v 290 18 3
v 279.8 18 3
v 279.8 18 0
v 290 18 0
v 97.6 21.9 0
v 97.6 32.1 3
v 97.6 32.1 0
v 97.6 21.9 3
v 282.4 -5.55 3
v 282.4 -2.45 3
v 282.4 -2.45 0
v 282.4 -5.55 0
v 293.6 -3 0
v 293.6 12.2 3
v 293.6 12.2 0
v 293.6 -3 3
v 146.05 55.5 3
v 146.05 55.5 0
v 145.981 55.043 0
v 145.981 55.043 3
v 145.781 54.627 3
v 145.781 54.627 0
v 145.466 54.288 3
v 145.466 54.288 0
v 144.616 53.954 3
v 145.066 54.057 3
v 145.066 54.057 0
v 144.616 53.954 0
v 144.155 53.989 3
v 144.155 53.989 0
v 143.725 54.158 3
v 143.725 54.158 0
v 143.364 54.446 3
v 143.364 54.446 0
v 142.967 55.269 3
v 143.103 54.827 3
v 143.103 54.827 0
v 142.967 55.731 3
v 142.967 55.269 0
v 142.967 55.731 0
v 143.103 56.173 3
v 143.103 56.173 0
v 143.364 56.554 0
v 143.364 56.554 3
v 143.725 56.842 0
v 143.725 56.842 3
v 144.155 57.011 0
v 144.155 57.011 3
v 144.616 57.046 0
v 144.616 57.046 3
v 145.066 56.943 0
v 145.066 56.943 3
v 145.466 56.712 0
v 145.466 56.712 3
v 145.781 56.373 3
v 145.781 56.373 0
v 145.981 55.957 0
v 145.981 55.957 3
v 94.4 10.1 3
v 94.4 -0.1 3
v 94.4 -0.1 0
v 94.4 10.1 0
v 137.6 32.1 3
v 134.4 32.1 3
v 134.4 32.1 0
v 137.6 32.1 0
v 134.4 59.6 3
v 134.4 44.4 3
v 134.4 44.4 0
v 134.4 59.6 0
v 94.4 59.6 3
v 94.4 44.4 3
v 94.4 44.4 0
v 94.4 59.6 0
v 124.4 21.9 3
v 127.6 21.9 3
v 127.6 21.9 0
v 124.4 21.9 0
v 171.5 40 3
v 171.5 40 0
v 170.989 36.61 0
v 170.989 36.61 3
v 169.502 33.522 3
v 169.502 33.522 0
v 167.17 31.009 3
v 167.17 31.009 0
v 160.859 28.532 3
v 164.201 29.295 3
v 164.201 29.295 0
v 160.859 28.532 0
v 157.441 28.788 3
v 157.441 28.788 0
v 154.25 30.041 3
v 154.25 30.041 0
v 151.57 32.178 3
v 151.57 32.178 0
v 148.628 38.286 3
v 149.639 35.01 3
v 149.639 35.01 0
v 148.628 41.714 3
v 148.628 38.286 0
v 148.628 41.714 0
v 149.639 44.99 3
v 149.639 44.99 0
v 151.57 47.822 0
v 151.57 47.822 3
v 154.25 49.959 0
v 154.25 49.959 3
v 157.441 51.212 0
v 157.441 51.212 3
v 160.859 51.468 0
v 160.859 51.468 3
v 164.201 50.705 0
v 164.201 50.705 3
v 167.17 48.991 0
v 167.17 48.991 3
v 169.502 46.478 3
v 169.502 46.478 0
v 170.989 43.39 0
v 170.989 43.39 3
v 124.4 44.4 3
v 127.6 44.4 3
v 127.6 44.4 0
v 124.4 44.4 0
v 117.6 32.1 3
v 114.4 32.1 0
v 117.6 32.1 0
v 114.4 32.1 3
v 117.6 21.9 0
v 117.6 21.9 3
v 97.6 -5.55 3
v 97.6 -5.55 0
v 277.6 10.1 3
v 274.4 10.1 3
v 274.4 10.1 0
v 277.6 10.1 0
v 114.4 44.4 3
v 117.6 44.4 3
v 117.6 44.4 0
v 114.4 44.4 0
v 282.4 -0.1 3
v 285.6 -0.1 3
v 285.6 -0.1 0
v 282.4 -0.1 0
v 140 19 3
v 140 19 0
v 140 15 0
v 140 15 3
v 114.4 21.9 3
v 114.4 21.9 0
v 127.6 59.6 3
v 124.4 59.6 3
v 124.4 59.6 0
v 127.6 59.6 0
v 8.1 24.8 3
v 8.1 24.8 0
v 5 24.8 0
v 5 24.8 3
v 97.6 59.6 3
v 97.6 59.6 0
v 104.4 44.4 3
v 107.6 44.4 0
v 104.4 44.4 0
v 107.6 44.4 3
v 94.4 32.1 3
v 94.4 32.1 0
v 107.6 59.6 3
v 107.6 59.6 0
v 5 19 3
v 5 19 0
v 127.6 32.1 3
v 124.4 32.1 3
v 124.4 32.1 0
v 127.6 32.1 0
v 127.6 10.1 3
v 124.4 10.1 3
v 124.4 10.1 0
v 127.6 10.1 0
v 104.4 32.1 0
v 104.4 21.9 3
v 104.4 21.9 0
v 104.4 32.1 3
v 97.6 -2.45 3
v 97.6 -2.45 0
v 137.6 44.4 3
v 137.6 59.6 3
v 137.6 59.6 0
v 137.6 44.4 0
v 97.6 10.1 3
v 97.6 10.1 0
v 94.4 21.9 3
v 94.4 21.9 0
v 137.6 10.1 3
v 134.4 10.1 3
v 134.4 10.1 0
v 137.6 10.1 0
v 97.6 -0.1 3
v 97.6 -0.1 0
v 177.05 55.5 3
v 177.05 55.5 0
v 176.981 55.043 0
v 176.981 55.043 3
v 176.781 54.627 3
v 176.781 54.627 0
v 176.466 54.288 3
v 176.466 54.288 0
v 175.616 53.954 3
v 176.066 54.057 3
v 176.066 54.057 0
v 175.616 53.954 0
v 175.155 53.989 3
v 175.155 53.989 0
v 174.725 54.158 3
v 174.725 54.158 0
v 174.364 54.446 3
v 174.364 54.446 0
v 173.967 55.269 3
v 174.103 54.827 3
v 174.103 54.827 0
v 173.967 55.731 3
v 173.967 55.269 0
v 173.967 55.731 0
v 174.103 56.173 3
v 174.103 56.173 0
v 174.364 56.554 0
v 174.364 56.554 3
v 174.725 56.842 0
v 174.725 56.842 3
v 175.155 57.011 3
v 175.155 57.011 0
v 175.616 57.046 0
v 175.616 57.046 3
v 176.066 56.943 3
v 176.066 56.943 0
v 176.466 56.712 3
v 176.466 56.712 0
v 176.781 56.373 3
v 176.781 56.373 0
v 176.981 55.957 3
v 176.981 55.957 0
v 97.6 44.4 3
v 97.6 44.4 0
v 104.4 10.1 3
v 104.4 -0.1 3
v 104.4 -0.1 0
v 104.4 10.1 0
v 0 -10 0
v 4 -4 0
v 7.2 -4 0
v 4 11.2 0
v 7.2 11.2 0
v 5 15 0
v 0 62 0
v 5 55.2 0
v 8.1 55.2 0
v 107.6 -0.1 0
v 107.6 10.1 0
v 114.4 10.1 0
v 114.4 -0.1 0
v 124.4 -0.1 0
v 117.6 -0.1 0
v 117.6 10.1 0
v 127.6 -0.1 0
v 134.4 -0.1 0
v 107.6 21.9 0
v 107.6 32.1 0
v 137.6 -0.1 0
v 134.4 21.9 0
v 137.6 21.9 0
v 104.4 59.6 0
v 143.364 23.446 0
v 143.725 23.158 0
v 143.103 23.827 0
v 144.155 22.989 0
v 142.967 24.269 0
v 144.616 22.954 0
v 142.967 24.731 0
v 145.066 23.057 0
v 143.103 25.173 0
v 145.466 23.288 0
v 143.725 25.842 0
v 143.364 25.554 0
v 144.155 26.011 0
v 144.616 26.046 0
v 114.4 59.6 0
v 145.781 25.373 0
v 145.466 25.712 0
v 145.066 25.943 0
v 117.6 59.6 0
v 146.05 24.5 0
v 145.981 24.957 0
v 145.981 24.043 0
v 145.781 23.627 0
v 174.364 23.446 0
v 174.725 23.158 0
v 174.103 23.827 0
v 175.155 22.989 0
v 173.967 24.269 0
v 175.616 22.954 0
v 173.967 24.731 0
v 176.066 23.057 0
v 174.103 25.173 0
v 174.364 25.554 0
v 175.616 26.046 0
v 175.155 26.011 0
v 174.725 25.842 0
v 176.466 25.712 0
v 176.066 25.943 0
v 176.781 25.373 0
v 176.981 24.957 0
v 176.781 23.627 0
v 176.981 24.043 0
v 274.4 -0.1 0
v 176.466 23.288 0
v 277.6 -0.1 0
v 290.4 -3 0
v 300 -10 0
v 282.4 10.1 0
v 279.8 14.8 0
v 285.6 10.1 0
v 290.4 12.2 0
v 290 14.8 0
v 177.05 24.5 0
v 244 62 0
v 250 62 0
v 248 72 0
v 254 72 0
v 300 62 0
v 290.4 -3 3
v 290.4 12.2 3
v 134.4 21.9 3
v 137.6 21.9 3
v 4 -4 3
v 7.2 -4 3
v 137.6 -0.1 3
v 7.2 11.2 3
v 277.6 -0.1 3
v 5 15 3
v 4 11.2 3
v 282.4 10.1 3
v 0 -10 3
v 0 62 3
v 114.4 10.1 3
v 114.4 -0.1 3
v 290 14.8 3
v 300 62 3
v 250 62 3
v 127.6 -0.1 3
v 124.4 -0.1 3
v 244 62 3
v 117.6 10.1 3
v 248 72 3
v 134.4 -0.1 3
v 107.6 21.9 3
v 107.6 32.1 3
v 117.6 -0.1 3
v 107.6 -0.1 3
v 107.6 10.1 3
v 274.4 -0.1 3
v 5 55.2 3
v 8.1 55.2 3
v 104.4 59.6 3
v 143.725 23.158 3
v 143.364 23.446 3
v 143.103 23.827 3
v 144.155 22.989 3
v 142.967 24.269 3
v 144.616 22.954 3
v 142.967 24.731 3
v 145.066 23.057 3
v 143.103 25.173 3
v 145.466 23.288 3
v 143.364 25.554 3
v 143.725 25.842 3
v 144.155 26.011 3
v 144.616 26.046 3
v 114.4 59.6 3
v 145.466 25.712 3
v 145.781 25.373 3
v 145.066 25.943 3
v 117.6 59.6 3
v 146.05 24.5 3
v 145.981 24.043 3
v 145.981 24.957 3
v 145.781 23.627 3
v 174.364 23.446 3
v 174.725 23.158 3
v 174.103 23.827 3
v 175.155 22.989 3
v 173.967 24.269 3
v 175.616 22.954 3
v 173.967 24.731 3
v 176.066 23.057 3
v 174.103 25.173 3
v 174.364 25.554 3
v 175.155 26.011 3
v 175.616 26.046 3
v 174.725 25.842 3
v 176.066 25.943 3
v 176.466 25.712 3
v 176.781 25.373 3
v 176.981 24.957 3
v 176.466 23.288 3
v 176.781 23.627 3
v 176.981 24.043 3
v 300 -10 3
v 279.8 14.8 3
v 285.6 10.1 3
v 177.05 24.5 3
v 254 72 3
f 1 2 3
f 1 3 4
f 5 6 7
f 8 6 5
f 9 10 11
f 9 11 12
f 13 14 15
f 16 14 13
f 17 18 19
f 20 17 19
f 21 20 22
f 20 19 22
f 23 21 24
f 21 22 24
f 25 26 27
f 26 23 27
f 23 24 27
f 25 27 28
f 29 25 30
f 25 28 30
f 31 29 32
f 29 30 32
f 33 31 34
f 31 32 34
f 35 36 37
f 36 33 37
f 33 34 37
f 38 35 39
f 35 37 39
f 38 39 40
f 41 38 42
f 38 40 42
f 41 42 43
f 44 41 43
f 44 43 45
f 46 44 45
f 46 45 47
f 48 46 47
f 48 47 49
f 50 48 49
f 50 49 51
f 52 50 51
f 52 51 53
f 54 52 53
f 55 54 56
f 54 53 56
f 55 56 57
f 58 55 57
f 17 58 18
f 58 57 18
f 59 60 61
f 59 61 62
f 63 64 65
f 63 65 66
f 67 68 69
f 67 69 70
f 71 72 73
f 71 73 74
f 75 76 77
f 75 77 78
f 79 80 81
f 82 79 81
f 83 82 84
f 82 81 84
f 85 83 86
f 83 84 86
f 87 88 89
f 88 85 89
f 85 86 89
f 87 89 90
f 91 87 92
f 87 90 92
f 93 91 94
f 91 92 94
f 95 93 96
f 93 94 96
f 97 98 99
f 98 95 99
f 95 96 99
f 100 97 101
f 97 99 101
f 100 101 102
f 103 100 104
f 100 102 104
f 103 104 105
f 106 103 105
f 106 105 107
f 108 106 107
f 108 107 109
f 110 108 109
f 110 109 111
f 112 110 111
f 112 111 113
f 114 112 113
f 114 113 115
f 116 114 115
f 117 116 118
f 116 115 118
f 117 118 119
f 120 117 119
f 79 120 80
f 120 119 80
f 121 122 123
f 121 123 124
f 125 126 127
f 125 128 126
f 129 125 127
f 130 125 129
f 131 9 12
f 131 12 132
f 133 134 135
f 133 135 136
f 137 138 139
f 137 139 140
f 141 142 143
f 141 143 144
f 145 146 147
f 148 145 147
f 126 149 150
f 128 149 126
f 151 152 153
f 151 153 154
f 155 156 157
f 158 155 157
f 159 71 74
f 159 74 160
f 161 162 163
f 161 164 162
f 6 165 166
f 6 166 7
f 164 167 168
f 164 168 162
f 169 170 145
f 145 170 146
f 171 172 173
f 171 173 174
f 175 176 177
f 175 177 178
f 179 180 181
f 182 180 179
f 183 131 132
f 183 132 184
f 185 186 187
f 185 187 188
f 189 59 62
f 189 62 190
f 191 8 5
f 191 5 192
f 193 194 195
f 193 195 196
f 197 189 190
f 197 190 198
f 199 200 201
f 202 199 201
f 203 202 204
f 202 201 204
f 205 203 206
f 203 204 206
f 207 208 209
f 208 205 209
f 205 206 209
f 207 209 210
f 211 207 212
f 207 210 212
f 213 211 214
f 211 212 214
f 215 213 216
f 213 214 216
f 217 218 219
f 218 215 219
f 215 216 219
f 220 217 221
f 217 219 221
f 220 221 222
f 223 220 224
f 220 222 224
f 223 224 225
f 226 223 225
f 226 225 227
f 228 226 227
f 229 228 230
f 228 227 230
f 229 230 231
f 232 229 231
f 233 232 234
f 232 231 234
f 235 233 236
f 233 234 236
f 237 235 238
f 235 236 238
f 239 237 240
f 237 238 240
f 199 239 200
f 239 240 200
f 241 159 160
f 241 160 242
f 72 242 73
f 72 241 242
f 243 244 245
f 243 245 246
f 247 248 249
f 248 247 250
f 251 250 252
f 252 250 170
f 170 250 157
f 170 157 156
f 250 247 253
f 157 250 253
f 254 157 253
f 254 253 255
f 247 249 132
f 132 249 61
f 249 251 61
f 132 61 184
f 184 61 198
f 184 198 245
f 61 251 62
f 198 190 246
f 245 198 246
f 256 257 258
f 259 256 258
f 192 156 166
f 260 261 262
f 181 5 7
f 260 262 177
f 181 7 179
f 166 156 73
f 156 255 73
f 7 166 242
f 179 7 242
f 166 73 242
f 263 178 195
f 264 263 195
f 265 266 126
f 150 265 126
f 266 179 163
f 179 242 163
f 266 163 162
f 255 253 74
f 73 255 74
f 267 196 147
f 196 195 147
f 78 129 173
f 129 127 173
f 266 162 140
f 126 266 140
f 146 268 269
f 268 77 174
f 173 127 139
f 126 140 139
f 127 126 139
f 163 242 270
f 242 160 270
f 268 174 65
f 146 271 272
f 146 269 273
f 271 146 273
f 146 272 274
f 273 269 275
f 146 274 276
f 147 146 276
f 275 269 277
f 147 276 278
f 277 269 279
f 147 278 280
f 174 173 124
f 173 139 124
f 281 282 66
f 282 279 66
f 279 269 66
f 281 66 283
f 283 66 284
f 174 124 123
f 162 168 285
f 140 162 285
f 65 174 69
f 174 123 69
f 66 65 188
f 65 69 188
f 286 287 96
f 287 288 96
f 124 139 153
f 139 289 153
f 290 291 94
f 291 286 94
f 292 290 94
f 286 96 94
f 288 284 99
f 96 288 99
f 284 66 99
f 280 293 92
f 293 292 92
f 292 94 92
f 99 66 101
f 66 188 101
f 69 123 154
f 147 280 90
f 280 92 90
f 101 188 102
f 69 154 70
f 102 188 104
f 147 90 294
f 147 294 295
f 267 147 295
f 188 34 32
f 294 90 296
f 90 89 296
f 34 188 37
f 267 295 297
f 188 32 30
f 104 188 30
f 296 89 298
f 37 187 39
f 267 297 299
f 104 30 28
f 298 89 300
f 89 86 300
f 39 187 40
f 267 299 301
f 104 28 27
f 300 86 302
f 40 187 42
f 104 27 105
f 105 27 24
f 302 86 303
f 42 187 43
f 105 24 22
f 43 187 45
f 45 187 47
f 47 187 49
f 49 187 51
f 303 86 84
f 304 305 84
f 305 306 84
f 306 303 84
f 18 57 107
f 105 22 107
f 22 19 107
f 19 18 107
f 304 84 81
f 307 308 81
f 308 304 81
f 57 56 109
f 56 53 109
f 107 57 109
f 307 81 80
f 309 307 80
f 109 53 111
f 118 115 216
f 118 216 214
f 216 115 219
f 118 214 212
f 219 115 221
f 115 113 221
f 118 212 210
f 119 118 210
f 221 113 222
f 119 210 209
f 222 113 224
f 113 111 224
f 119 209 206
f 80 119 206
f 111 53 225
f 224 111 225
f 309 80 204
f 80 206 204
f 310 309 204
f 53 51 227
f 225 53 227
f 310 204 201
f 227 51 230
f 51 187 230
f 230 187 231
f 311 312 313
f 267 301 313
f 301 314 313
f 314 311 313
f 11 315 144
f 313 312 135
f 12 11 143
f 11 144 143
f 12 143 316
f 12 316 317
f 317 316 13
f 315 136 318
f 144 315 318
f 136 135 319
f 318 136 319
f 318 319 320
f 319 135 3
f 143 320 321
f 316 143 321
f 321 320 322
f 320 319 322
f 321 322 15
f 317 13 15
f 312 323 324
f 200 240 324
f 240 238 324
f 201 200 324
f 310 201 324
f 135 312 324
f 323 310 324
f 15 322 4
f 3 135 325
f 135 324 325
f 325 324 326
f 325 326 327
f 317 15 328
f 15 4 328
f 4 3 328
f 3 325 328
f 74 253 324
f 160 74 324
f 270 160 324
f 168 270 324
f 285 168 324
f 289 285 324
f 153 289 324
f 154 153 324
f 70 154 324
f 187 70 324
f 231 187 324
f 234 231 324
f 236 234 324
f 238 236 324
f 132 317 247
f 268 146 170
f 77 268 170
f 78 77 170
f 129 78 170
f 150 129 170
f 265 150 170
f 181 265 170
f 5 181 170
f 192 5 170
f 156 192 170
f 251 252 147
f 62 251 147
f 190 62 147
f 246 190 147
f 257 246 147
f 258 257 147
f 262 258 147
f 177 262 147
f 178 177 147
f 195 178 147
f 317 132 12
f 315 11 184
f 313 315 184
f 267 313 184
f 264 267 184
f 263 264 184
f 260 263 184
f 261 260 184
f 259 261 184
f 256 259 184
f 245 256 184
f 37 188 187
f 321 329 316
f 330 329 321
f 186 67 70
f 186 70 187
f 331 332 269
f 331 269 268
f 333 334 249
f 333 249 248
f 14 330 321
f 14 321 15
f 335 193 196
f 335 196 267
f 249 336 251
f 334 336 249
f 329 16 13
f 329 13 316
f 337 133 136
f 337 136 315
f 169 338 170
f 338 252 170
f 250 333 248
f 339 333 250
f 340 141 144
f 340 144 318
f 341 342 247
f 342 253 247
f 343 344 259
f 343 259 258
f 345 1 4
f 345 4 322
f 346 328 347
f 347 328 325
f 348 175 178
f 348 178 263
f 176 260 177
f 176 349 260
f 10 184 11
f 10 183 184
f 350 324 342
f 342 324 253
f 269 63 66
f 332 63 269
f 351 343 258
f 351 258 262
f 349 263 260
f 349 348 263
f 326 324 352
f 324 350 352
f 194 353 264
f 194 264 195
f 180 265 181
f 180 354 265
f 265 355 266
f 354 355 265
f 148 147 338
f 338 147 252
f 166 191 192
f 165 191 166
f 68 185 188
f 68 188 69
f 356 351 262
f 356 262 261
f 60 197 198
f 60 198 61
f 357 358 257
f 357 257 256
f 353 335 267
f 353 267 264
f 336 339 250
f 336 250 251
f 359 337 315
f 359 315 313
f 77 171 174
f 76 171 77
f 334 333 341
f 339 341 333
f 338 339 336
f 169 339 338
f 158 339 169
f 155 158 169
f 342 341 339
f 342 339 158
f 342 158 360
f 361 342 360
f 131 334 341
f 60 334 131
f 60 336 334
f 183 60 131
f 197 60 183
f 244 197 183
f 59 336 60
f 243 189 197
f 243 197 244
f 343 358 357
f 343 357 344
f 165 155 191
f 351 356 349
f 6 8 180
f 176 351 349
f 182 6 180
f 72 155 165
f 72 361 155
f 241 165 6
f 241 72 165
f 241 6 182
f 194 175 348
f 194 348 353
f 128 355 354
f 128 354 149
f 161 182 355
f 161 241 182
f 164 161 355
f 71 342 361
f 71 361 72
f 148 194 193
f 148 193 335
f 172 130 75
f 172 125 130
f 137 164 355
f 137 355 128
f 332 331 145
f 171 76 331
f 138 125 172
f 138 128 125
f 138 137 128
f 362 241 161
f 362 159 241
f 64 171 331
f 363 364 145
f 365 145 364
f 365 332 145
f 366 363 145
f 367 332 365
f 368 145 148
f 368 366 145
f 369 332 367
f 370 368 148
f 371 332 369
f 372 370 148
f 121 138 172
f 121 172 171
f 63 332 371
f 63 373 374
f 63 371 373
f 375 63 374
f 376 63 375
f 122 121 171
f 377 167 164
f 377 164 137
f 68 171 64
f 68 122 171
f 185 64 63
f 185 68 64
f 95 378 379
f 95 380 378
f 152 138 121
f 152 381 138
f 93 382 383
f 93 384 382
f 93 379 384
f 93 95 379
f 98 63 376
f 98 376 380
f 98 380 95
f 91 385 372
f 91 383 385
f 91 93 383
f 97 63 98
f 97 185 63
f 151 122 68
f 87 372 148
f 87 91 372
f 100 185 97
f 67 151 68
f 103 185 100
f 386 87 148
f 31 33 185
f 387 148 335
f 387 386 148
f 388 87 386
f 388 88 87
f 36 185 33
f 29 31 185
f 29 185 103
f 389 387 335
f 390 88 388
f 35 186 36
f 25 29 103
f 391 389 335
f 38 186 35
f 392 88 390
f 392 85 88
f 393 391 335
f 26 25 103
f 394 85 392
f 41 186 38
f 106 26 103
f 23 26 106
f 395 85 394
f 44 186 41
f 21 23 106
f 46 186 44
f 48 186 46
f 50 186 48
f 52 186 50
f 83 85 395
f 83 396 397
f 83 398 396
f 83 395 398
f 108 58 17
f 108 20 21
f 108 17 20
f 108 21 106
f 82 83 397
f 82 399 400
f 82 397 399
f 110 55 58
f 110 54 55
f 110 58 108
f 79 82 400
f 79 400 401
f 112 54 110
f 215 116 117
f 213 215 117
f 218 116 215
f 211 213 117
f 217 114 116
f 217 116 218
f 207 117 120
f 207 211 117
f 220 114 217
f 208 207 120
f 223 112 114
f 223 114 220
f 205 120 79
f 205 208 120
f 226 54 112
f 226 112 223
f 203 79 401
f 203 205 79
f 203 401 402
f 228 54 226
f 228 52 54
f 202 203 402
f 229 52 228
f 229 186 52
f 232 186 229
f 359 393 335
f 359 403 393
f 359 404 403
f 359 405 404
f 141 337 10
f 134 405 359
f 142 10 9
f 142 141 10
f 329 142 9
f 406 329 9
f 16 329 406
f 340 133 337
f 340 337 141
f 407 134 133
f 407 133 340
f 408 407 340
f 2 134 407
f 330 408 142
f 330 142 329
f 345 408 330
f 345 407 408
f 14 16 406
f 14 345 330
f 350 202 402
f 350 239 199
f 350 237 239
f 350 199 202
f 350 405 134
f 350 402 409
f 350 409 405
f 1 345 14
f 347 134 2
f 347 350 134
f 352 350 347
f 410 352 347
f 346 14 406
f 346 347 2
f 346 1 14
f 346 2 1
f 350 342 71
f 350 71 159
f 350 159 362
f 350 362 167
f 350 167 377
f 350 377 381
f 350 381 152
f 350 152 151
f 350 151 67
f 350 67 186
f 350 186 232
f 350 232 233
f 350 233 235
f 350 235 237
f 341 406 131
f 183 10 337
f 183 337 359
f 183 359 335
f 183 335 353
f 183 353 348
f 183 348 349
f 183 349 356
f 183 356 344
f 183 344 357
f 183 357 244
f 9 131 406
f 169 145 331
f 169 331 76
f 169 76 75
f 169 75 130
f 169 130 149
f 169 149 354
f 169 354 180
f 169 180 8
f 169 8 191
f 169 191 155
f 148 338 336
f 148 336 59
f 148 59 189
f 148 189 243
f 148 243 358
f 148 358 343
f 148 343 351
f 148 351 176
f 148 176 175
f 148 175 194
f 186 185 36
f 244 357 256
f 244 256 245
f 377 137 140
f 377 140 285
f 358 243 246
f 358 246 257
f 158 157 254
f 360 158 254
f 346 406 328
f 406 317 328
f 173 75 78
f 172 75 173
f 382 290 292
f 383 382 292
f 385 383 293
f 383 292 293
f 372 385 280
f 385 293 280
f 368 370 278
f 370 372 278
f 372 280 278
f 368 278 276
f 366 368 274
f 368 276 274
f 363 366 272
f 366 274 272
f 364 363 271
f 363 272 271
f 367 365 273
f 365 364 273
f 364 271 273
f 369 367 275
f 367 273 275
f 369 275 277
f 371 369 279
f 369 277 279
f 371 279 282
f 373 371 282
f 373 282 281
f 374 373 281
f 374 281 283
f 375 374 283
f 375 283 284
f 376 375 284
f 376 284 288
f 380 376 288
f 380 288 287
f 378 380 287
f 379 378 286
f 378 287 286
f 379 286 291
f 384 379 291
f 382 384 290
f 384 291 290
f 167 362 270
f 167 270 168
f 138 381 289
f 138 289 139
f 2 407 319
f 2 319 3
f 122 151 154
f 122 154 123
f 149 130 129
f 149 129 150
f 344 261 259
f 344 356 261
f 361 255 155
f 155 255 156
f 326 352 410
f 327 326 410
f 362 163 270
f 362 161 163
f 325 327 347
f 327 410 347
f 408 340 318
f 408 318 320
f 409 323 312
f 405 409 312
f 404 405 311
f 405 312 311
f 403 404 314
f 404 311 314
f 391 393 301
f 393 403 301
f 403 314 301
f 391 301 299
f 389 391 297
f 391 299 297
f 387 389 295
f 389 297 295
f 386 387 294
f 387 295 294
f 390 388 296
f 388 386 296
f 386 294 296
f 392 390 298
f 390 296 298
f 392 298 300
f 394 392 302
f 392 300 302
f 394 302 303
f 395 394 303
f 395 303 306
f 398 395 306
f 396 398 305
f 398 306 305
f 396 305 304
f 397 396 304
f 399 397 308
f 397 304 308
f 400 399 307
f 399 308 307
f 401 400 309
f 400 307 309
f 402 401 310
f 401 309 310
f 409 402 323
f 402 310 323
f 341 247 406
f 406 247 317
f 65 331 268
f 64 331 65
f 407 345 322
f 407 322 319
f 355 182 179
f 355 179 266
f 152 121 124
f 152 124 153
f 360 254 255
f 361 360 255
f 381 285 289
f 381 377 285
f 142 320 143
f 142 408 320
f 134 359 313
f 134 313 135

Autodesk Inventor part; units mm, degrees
ref_plane "YZ Plane" through (0, 0, 0) normal (1, 0, 0) x (0, 1, 0)
ref_plane "XZ Plane" through (0, 0, 0) normal (0, 1, 0) x (-1, 0, 0)
ref_plane "XY Plane" through (0, 0, 0) normal (0, 0, 1) x (1, 0, 0)
sketch "Sketch1" plane through (0, 0, 0) normal (0, 0, 1) x (1, 0, 0)
  line L0 (0, 0) -> (300, 0)
  line L1 (300, 0) -> (300, 62)
  line L2 (300, 62) -> (0, 62)
  line L3 (0, 62) -> (0, 0)
  circle A0 centre (144.5, 55.5) radius 1.55
  circle A1 centre (144.5, 24.5) radius 1.55
  circle A2 centre (175.5, 55.5) radius 1.55
  circle A3 centre (175.5, 24.5) radius 1.55
  circle A4 centre (160, 40) radius 11.5
  line L4 (5, 19) -> (140, 19)
  line L5 (140, 19) -> (140, 15)
  line L6 (140, 15) -> (5, 15)
  line L7 (5, 15) -> (5, 19)
  line L8 (0, 62) -> (39.6145, 62)
  line L9 (8.1, 24.8) -> (5, 24.8)
  line L10 (5, 24.8) -> (5, 55.2)
  line L11 (5, 55.2) -> (8.1, 55.2)
  line L12 (8.1, 55.2) -> (8.1, 24.8)
  line L13 (8.1, 24.8) -> (5, 55.2) construction
  line L14 (5, 24.8) -> (8.1, 55.2) construction
  line L15 (0, 62) -> (50, 62)
  line L16 (0, 0) -> (0, -10)
  line L17 (0, -10) -> (300, -10)
  line L18 (300, -10) -> (300, 0)
  point P0 (6.55, 40)
  point P1 (5, 40)
  point P2 (8.1, 40)
  point P3 (5, 17)
  point P4 (140, 17)
  dimension "d1" = 3.1
  dimension "d2" = 3.1
  dimension "d3" = 3.1
  dimension "d4" = 3.1
  dimension "d5" = 31
  dimension "d7" = 23
  dimension "d8" = 15.5
  dimension "d9" = 15.5
  dimension "d10" = 62
  dimension "d11" = 31
  dimension "d13" = 40
  dimension "d54" = 300
  dimension "d55" = 3.1
  dimension "d56" = 5
  dimension "d57" = 15.2
  dimension "d59" = 135
  dimension "d93" = 15
  dimension "d106" = 20
  dimension "d107" = 5
  dimension "d201" = 4
  dimension "d202" = 10
extrude "Extrusion1" add sketch "Sketch1" along normal blind 3
sketch "Sketch4" plane through (0, 0, 3) normal (0, 0, 1) x (1, 0, 0)
  line L0 (300, 62) -> (0, 62) projected
  line L1 (244, 62) -> (248, 72)
  line L2 (248, 72) -> (254, 72)
  line L3 (254, 72) -> (250, 62)
  line L4 (0, -10) -> (300, -10) projected
  point P0 (0, 0)
  dimension "d108" = 10
  dimension "d109" = 4
  dimension "d110" = 50
  dimension "d111" = 6
extrude "Extrusion4" add sketch "Sketch4" against normal blind 3
sketch "Sketch7" plane through (0, 0, 3) normal (0, 0, 1) x (1, 0, 0)
  line L0 (134.4, 59.6) -> (137.6, 59.6)
  line L1 (137.6, 59.6) -> (137.6, 44.4)
  line L2 (137.6, 44.4) -> (134.4, 44.4)
  line L3 (134.4, 44.4) -> (134.4, 59.6)
  line L4 (134.4, 59.6) -> (137.6, 44.4) construction
  line L5 (137.6, 59.6) -> (134.4, 44.4) construction
  line L6 (134.4, 32.1) -> (137.6, 32.1)
  line L7 (137.6, 32.1) -> (137.6, 21.9)
  line L8 (137.6, 21.9) -> (134.4, 21.9)
  line L9 (134.4, 21.9) -> (134.4, 32.1)
  line L10 (134.4, 32.1) -> (137.6, 21.9) construction
  line L11 (137.6, 32.1) -> (134.4, 21.9) construction
  line L12 (244, 62) -> (0, 62) projected
  circle A0 centre (144.5, 55.5) radius 1.55 projected
  line L13 (124.4, 59.6) -> (127.6, 59.6)
  line L14 (127.6, 59.6) -> (127.6, 44.4)
  line L15 (127.6, 44.4) -> (124.4, 44.4)
  line L16 (124.4, 44.4) -> (124.4, 59.6)
  line L17 (124.4, 59.6) -> (127.6, 44.4) construction
  line L18 (127.6, 59.6) -> (124.4, 44.4) construction
  line L19 (124.4, 32.1) -> (127.6, 32.1)
  line L20 (127.6, 32.1) -> (127.6, 21.9)
  line L21 (127.6, 21.9) -> (124.4, 21.9)
  line L22 (124.4, 21.9) -> (124.4, 32.1)
  line L23 (124.4, 32.1) -> (127.6, 21.9) construction
  line L24 (127.6, 32.1) -> (124.4, 21.9) construction
  line L25 (114.4, 59.6) -> (117.6, 59.6)
  line L26 (117.6, 59.6) -> (117.6, 44.4)
  line L27 (117.6, 44.4) -> (114.4, 44.4)
  line L28 (114.4, 44.4) -> (114.4, 59.6)
  line L29 (114.4, 59.6) -> (117.6, 44.4) construction
  line L30 (117.6, 59.6) -> (114.4, 44.4) construction
  line L31 (114.4, 32.1) -> (117.6, 32.1)
  line L32 (117.6, 32.1) -> (117.6, 21.9)
  line L33 (117.6, 21.9) -> (114.4, 21.9)
  line L34 (114.4, 21.9) -> (114.4, 32.1)
  line L35 (114.4, 32.1) -> (117.6, 21.9) construction
  line L36 (117.6, 32.1) -> (114.4, 21.9) construction
  line L37 (104.4, 59.6) -> (107.6, 59.6)
  line L38 (107.6, 59.6) -> (107.6, 44.4)
  line L39 (107.6, 44.4) -> (104.4, 44.4)
  line L40 (104.4, 44.4) -> (104.4, 59.6)
  line L41 (104.4, 59.6) -> (107.6, 44.4) construction
  line L42 (107.6, 59.6) -> (104.4, 44.4) construction
  line L43 (104.4, 32.1) -> (107.6, 32.1)
  line L44 (107.6, 32.1) -> (107.6, 21.9)
  line L45 (107.6, 21.9) -> (104.4, 21.9)
  line L46 (104.4, 21.9) -> (104.4, 32.1)
  line L47 (104.4, 32.1) -> (107.6, 21.9) construction
  line L48 (107.6, 32.1) -> (104.4, 21.9) construction
  line L49 (94.4, 59.6) -> (97.6, 59.6)
  line L50 (97.6, 59.6) -> (97.6, 44.4)
  line L51 (97.6, 44.4) -> (94.4, 44.4)
  line L52 (94.4, 44.4) -> (94.4, 59.6)
  line L53 (94.4, 59.6) -> (97.6, 44.4) construction
  line L54 (97.6, 59.6) -> (94.4, 44.4) construction
  line L55 (94.4, 32.1) -> (97.6, 32.1)
  line L56 (97.6, 32.1) -> (97.6, 21.9)
  line L57 (97.6, 21.9) -> (94.4, 21.9)
  line L58 (94.4, 21.9) -> (94.4, 32.1)
  line L59 (94.4, 32.1) -> (97.6, 21.9) construction
  line L60 (97.6, 32.1) -> (94.4, 21.9) construction
  line L61 (134.4, 10.1) -> (137.6, 10.1)
  line L62 (137.6, 10.1) -> (137.6, -0.1)
  line L63 (137.6, -0.1) -> (134.4, -0.1)
  line L64 (134.4, -0.1) -> (134.4, 10.1)
  line L65 (134.4, 10.1) -> (137.6, -0.1) construction
  line L66 (137.6, 10.1) -> (134.4, -0.1) construction
  line L67 (127.6, 10.1) -> (127.6, -0.1)
  line L68 (127.6, -0.1) -> (124.4, -0.1)
  line L69 (124.4, 10.1) -> (127.6, 10.1)
  line L70 (124.4, -0.1) -> (124.4, 10.1)
  line L71 (124.4, 10.1) -> (127.6, -0.1) construction
  line L72 (127.6, 10.1) -> (124.4, -0.1) construction
  line L73 (117.6, 10.1) -> (117.6, -0.1)
  line L74 (117.6, -0.1) -> (114.4, -0.1)
  line L75 (114.4, 10.1) -> (117.6, 10.1)
  line L76 (114.4, -0.1) -> (114.4, 10.1)
  line L77 (114.4, 10.1) -> (117.6, -0.1) construction
  line L78 (117.6, 10.1) -> (114.4, -0.1) construction
  line L79 (107.6, 10.1) -> (107.6, -0.1)
  line L80 (107.6, -0.1) -> (104.4, -0.1)
  line L81 (104.4, 10.1) -> (107.6, 10.1)
  line L82 (104.4, -0.1) -> (104.4, 10.1)
  line L83 (104.4, 10.1) -> (107.6, -0.1) construction
  line L84 (107.6, 10.1) -> (104.4, -0.1) construction
  line L85 (97.6, 10.1) -> (97.6, -0.1)
  line L86 (97.6, -0.1) -> (94.4, -0.1)
  line L87 (94.4, 10.1) -> (97.6, 10.1)
  line L88 (94.4, -0.1) -> (94.4, 10.1)
  line L89 (94.4, 10.1) -> (97.6, -0.1) construction
  line L90 (97.6, 10.1) -> (94.4, -0.1) construction
  line L91 (0, -10) -> (300, -10) projected
  line L92 (300, -10) -> (300, 62) projected
  point P0 (0, 0)
  point P1 (136, 52)
  point P2 (136, 27)
  point P3 (126, 52)
  point P4 (126, 27)
  point P5 (116, 52)
  point P6 (116, 27)
  point P7 (106, 52)
  point P8 (106, 27)
  point P9 (96, 52)
  point P10 (96, 27)
  point P11 (134.4, 52)
  point P12 (114.4, 52)
  point P13 (136, 5)
  point P14 (126, 5)
  point P15 (116, 5)
  point P16 (106, 5)
  point P17 (96, 5)
  point P18 (134.4, 5)
  point P19 (114.4, 5)
  point P20 (150, -10)
  dimension "d147" = 3.2
  dimension "d148" = 15.2
  dimension "d149" = 10.2
  dimension "d150" = 25
  dimension "d151" = 10
  dimension "d153" = 3.2
  dimension "d154" = 15.2
  dimension "d155" = 10.2
  dimension "d156" = 25
  dimension "d157" = 3.2
  dimension "d158" = 15.2
  dimension "d159" = 10.2
  dimension "d160" = 25
  dimension "d161" = 3.2
  dimension "d162" = 15.2
  dimension "d163" = 10.2
  dimension "d164" = 25
  dimension "d165" = 3.2
  dimension "d166" = 15.2
  dimension "d167" = 10.2
  dimension "d168" = 25
  dimension "d169" = 10
  dimension "d170" = 10
  dimension "d171" = 10
  dimension "d172" = 10
  dimension "d181" = 3.2
  dimension "d183" = 3.2
  dimension "d185" = 3.2
  dimension "d187" = 3.2
  dimension "d189" = 3.2
  dimension "d191" = 10
  dimension "d192" = 10
  dimension "d193" = 10
  dimension "d194" = 10
  dimension "d234" = 15
  dimension "d235" = 10.2
  dimension "d245" = 164
extrude "Extrusion6" cut sketch "Sketch7" against normal blind 3 contours L0 L1 L2 L3 | L6 L7 L8 L9 | L13 L14 L15 L16 | L19 L20 L21 L22 | L25 L26 L27 L28 | L31 L32 L33 L34 | L37 L38 L39 L40 | L43 L44 L45 L46 | L49 L50 L51 L52 | L55 L56 L57 L58 | L61 L62 L63 L64 | L67 L68 L70 L69 | L73 L74 L76 L75 | L79 L80 L82 L81 | L85 L86 L88 L87
sketch "Sketch8" plane through (0, 0, 3) normal (0, 0, 1) x (1, 0, 0)
  line L0 (0, -10) -> (300, -10) projected
  line L1 (279.8, 18) -> (290, 18)
  line L2 (290, 18) -> (290, 14.8)
  line L3 (290, 14.8) -> (279.8, 14.8)
  line L4 (279.8, 14.8) -> (279.8, 18)
  line L5 (300, -10) -> (300, 62) projected
  line L6 (4, 11.2) -> (7.2, 11.2)
  line L7 (7.2, 11.2) -> (7.2, -4)
  line L8 (7.2, -4) -> (4, -4)
  line L9 (4, -4) -> (4, 11.2)
  line L10 (4, 11.2) -> (7.2, -4) construction
  line L11 (7.2, 11.2) -> (4, -4) construction
  line L12 (282.4, 10.1) -> (285.6, 10.1)
  line L13 (285.6, 10.1) -> (285.6, -0.1)
  line L14 (285.6, -0.1) -> (282.4, -0.1)
  line L15 (282.4, -0.1) -> (282.4, 10.1)
  line L16 (282.4, 10.1) -> (285.6, -0.1) construction
  line L17 (285.6, 10.1) -> (282.4, -0.1) construction
  line L18 (274.4, 10.1) -> (277.6, 10.1)
  line L19 (277.6, 10.1) -> (277.6, -0.1)
  line L20 (277.6, -0.1) -> (274.4, -0.1)
  line L21 (274.4, -0.1) -> (274.4, 10.1)
  line L22 (274.4, 10.1) -> (277.6, -0.1) construction
  line L23 (277.6, 10.1) -> (274.4, -0.1) construction
  line L24 (97.6, -2.45) -> (282.4, -2.45)
  line L25 (282.4, -2.45) -> (282.4, -5.55)
  line L26 (282.4, -5.55) -> (97.6, -5.55)
  line L27 (97.6, -5.55) -> (97.6, -2.45)
  line L28 (97.6, -2.45) -> (282.4, -5.55) construction
  line L29 (282.4, -2.45) -> (97.6, -5.55) construction
  line L30 (137.6, 10.1) -> (137.6, -0.1) projected
  line L31 (290.4, 12.2) -> (293.6, 12.2)
  line L32 (293.6, 12.2) -> (293.6, -3)
  line L33 (293.6, -3) -> (290.4, -3)
  line L34 (290.4, -3) -> (290.4, 12.2)
  line L35 (290.4, 12.2) -> (293.6, -3) construction
  line L36 (293.6, 12.2) -> (290.4, -3) construction
  point P0 (0, 0)
  point P1 (5.6, 3.6)
  point P2 (4, 3.6)
  point P3 (284, 5)
  point P4 (282.4, 5)
  point P5 (276, 5)
  point P6 (274.4, 5)
  point P7 (190, -4)
  point P8 (137.6, 5)
  point P9 (97.6, -0.1)
  point P10 (292, 4.6)
  dimension "d219" = 28
  dimension "d220" = 3.2
  dimension "d221" = 10.2
  dimension "d222" = 10
  dimension "d223" = 3.2
  dimension "d224" = 15.2
  dimension "d225" = 4
  dimension "d226" = 6
  dimension "d227" = 3.2
  dimension "d229" = 3.2
  dimension "d232" = 8
  dimension "d233" = 15
  dimension "d236" = 3.1
  dimension "d237" = 9
  dimension "d238" = 10.2
  dimension "d240" = 3.2
  dimension "d241" = 15.2
  dimension "d242" = 7
  dimension "d243" = 16
  dimension "d244" = 8
extrude "Extrusion7" cut sketch "Sketch8" against normal blind 3
properties part number "Sideboard"
